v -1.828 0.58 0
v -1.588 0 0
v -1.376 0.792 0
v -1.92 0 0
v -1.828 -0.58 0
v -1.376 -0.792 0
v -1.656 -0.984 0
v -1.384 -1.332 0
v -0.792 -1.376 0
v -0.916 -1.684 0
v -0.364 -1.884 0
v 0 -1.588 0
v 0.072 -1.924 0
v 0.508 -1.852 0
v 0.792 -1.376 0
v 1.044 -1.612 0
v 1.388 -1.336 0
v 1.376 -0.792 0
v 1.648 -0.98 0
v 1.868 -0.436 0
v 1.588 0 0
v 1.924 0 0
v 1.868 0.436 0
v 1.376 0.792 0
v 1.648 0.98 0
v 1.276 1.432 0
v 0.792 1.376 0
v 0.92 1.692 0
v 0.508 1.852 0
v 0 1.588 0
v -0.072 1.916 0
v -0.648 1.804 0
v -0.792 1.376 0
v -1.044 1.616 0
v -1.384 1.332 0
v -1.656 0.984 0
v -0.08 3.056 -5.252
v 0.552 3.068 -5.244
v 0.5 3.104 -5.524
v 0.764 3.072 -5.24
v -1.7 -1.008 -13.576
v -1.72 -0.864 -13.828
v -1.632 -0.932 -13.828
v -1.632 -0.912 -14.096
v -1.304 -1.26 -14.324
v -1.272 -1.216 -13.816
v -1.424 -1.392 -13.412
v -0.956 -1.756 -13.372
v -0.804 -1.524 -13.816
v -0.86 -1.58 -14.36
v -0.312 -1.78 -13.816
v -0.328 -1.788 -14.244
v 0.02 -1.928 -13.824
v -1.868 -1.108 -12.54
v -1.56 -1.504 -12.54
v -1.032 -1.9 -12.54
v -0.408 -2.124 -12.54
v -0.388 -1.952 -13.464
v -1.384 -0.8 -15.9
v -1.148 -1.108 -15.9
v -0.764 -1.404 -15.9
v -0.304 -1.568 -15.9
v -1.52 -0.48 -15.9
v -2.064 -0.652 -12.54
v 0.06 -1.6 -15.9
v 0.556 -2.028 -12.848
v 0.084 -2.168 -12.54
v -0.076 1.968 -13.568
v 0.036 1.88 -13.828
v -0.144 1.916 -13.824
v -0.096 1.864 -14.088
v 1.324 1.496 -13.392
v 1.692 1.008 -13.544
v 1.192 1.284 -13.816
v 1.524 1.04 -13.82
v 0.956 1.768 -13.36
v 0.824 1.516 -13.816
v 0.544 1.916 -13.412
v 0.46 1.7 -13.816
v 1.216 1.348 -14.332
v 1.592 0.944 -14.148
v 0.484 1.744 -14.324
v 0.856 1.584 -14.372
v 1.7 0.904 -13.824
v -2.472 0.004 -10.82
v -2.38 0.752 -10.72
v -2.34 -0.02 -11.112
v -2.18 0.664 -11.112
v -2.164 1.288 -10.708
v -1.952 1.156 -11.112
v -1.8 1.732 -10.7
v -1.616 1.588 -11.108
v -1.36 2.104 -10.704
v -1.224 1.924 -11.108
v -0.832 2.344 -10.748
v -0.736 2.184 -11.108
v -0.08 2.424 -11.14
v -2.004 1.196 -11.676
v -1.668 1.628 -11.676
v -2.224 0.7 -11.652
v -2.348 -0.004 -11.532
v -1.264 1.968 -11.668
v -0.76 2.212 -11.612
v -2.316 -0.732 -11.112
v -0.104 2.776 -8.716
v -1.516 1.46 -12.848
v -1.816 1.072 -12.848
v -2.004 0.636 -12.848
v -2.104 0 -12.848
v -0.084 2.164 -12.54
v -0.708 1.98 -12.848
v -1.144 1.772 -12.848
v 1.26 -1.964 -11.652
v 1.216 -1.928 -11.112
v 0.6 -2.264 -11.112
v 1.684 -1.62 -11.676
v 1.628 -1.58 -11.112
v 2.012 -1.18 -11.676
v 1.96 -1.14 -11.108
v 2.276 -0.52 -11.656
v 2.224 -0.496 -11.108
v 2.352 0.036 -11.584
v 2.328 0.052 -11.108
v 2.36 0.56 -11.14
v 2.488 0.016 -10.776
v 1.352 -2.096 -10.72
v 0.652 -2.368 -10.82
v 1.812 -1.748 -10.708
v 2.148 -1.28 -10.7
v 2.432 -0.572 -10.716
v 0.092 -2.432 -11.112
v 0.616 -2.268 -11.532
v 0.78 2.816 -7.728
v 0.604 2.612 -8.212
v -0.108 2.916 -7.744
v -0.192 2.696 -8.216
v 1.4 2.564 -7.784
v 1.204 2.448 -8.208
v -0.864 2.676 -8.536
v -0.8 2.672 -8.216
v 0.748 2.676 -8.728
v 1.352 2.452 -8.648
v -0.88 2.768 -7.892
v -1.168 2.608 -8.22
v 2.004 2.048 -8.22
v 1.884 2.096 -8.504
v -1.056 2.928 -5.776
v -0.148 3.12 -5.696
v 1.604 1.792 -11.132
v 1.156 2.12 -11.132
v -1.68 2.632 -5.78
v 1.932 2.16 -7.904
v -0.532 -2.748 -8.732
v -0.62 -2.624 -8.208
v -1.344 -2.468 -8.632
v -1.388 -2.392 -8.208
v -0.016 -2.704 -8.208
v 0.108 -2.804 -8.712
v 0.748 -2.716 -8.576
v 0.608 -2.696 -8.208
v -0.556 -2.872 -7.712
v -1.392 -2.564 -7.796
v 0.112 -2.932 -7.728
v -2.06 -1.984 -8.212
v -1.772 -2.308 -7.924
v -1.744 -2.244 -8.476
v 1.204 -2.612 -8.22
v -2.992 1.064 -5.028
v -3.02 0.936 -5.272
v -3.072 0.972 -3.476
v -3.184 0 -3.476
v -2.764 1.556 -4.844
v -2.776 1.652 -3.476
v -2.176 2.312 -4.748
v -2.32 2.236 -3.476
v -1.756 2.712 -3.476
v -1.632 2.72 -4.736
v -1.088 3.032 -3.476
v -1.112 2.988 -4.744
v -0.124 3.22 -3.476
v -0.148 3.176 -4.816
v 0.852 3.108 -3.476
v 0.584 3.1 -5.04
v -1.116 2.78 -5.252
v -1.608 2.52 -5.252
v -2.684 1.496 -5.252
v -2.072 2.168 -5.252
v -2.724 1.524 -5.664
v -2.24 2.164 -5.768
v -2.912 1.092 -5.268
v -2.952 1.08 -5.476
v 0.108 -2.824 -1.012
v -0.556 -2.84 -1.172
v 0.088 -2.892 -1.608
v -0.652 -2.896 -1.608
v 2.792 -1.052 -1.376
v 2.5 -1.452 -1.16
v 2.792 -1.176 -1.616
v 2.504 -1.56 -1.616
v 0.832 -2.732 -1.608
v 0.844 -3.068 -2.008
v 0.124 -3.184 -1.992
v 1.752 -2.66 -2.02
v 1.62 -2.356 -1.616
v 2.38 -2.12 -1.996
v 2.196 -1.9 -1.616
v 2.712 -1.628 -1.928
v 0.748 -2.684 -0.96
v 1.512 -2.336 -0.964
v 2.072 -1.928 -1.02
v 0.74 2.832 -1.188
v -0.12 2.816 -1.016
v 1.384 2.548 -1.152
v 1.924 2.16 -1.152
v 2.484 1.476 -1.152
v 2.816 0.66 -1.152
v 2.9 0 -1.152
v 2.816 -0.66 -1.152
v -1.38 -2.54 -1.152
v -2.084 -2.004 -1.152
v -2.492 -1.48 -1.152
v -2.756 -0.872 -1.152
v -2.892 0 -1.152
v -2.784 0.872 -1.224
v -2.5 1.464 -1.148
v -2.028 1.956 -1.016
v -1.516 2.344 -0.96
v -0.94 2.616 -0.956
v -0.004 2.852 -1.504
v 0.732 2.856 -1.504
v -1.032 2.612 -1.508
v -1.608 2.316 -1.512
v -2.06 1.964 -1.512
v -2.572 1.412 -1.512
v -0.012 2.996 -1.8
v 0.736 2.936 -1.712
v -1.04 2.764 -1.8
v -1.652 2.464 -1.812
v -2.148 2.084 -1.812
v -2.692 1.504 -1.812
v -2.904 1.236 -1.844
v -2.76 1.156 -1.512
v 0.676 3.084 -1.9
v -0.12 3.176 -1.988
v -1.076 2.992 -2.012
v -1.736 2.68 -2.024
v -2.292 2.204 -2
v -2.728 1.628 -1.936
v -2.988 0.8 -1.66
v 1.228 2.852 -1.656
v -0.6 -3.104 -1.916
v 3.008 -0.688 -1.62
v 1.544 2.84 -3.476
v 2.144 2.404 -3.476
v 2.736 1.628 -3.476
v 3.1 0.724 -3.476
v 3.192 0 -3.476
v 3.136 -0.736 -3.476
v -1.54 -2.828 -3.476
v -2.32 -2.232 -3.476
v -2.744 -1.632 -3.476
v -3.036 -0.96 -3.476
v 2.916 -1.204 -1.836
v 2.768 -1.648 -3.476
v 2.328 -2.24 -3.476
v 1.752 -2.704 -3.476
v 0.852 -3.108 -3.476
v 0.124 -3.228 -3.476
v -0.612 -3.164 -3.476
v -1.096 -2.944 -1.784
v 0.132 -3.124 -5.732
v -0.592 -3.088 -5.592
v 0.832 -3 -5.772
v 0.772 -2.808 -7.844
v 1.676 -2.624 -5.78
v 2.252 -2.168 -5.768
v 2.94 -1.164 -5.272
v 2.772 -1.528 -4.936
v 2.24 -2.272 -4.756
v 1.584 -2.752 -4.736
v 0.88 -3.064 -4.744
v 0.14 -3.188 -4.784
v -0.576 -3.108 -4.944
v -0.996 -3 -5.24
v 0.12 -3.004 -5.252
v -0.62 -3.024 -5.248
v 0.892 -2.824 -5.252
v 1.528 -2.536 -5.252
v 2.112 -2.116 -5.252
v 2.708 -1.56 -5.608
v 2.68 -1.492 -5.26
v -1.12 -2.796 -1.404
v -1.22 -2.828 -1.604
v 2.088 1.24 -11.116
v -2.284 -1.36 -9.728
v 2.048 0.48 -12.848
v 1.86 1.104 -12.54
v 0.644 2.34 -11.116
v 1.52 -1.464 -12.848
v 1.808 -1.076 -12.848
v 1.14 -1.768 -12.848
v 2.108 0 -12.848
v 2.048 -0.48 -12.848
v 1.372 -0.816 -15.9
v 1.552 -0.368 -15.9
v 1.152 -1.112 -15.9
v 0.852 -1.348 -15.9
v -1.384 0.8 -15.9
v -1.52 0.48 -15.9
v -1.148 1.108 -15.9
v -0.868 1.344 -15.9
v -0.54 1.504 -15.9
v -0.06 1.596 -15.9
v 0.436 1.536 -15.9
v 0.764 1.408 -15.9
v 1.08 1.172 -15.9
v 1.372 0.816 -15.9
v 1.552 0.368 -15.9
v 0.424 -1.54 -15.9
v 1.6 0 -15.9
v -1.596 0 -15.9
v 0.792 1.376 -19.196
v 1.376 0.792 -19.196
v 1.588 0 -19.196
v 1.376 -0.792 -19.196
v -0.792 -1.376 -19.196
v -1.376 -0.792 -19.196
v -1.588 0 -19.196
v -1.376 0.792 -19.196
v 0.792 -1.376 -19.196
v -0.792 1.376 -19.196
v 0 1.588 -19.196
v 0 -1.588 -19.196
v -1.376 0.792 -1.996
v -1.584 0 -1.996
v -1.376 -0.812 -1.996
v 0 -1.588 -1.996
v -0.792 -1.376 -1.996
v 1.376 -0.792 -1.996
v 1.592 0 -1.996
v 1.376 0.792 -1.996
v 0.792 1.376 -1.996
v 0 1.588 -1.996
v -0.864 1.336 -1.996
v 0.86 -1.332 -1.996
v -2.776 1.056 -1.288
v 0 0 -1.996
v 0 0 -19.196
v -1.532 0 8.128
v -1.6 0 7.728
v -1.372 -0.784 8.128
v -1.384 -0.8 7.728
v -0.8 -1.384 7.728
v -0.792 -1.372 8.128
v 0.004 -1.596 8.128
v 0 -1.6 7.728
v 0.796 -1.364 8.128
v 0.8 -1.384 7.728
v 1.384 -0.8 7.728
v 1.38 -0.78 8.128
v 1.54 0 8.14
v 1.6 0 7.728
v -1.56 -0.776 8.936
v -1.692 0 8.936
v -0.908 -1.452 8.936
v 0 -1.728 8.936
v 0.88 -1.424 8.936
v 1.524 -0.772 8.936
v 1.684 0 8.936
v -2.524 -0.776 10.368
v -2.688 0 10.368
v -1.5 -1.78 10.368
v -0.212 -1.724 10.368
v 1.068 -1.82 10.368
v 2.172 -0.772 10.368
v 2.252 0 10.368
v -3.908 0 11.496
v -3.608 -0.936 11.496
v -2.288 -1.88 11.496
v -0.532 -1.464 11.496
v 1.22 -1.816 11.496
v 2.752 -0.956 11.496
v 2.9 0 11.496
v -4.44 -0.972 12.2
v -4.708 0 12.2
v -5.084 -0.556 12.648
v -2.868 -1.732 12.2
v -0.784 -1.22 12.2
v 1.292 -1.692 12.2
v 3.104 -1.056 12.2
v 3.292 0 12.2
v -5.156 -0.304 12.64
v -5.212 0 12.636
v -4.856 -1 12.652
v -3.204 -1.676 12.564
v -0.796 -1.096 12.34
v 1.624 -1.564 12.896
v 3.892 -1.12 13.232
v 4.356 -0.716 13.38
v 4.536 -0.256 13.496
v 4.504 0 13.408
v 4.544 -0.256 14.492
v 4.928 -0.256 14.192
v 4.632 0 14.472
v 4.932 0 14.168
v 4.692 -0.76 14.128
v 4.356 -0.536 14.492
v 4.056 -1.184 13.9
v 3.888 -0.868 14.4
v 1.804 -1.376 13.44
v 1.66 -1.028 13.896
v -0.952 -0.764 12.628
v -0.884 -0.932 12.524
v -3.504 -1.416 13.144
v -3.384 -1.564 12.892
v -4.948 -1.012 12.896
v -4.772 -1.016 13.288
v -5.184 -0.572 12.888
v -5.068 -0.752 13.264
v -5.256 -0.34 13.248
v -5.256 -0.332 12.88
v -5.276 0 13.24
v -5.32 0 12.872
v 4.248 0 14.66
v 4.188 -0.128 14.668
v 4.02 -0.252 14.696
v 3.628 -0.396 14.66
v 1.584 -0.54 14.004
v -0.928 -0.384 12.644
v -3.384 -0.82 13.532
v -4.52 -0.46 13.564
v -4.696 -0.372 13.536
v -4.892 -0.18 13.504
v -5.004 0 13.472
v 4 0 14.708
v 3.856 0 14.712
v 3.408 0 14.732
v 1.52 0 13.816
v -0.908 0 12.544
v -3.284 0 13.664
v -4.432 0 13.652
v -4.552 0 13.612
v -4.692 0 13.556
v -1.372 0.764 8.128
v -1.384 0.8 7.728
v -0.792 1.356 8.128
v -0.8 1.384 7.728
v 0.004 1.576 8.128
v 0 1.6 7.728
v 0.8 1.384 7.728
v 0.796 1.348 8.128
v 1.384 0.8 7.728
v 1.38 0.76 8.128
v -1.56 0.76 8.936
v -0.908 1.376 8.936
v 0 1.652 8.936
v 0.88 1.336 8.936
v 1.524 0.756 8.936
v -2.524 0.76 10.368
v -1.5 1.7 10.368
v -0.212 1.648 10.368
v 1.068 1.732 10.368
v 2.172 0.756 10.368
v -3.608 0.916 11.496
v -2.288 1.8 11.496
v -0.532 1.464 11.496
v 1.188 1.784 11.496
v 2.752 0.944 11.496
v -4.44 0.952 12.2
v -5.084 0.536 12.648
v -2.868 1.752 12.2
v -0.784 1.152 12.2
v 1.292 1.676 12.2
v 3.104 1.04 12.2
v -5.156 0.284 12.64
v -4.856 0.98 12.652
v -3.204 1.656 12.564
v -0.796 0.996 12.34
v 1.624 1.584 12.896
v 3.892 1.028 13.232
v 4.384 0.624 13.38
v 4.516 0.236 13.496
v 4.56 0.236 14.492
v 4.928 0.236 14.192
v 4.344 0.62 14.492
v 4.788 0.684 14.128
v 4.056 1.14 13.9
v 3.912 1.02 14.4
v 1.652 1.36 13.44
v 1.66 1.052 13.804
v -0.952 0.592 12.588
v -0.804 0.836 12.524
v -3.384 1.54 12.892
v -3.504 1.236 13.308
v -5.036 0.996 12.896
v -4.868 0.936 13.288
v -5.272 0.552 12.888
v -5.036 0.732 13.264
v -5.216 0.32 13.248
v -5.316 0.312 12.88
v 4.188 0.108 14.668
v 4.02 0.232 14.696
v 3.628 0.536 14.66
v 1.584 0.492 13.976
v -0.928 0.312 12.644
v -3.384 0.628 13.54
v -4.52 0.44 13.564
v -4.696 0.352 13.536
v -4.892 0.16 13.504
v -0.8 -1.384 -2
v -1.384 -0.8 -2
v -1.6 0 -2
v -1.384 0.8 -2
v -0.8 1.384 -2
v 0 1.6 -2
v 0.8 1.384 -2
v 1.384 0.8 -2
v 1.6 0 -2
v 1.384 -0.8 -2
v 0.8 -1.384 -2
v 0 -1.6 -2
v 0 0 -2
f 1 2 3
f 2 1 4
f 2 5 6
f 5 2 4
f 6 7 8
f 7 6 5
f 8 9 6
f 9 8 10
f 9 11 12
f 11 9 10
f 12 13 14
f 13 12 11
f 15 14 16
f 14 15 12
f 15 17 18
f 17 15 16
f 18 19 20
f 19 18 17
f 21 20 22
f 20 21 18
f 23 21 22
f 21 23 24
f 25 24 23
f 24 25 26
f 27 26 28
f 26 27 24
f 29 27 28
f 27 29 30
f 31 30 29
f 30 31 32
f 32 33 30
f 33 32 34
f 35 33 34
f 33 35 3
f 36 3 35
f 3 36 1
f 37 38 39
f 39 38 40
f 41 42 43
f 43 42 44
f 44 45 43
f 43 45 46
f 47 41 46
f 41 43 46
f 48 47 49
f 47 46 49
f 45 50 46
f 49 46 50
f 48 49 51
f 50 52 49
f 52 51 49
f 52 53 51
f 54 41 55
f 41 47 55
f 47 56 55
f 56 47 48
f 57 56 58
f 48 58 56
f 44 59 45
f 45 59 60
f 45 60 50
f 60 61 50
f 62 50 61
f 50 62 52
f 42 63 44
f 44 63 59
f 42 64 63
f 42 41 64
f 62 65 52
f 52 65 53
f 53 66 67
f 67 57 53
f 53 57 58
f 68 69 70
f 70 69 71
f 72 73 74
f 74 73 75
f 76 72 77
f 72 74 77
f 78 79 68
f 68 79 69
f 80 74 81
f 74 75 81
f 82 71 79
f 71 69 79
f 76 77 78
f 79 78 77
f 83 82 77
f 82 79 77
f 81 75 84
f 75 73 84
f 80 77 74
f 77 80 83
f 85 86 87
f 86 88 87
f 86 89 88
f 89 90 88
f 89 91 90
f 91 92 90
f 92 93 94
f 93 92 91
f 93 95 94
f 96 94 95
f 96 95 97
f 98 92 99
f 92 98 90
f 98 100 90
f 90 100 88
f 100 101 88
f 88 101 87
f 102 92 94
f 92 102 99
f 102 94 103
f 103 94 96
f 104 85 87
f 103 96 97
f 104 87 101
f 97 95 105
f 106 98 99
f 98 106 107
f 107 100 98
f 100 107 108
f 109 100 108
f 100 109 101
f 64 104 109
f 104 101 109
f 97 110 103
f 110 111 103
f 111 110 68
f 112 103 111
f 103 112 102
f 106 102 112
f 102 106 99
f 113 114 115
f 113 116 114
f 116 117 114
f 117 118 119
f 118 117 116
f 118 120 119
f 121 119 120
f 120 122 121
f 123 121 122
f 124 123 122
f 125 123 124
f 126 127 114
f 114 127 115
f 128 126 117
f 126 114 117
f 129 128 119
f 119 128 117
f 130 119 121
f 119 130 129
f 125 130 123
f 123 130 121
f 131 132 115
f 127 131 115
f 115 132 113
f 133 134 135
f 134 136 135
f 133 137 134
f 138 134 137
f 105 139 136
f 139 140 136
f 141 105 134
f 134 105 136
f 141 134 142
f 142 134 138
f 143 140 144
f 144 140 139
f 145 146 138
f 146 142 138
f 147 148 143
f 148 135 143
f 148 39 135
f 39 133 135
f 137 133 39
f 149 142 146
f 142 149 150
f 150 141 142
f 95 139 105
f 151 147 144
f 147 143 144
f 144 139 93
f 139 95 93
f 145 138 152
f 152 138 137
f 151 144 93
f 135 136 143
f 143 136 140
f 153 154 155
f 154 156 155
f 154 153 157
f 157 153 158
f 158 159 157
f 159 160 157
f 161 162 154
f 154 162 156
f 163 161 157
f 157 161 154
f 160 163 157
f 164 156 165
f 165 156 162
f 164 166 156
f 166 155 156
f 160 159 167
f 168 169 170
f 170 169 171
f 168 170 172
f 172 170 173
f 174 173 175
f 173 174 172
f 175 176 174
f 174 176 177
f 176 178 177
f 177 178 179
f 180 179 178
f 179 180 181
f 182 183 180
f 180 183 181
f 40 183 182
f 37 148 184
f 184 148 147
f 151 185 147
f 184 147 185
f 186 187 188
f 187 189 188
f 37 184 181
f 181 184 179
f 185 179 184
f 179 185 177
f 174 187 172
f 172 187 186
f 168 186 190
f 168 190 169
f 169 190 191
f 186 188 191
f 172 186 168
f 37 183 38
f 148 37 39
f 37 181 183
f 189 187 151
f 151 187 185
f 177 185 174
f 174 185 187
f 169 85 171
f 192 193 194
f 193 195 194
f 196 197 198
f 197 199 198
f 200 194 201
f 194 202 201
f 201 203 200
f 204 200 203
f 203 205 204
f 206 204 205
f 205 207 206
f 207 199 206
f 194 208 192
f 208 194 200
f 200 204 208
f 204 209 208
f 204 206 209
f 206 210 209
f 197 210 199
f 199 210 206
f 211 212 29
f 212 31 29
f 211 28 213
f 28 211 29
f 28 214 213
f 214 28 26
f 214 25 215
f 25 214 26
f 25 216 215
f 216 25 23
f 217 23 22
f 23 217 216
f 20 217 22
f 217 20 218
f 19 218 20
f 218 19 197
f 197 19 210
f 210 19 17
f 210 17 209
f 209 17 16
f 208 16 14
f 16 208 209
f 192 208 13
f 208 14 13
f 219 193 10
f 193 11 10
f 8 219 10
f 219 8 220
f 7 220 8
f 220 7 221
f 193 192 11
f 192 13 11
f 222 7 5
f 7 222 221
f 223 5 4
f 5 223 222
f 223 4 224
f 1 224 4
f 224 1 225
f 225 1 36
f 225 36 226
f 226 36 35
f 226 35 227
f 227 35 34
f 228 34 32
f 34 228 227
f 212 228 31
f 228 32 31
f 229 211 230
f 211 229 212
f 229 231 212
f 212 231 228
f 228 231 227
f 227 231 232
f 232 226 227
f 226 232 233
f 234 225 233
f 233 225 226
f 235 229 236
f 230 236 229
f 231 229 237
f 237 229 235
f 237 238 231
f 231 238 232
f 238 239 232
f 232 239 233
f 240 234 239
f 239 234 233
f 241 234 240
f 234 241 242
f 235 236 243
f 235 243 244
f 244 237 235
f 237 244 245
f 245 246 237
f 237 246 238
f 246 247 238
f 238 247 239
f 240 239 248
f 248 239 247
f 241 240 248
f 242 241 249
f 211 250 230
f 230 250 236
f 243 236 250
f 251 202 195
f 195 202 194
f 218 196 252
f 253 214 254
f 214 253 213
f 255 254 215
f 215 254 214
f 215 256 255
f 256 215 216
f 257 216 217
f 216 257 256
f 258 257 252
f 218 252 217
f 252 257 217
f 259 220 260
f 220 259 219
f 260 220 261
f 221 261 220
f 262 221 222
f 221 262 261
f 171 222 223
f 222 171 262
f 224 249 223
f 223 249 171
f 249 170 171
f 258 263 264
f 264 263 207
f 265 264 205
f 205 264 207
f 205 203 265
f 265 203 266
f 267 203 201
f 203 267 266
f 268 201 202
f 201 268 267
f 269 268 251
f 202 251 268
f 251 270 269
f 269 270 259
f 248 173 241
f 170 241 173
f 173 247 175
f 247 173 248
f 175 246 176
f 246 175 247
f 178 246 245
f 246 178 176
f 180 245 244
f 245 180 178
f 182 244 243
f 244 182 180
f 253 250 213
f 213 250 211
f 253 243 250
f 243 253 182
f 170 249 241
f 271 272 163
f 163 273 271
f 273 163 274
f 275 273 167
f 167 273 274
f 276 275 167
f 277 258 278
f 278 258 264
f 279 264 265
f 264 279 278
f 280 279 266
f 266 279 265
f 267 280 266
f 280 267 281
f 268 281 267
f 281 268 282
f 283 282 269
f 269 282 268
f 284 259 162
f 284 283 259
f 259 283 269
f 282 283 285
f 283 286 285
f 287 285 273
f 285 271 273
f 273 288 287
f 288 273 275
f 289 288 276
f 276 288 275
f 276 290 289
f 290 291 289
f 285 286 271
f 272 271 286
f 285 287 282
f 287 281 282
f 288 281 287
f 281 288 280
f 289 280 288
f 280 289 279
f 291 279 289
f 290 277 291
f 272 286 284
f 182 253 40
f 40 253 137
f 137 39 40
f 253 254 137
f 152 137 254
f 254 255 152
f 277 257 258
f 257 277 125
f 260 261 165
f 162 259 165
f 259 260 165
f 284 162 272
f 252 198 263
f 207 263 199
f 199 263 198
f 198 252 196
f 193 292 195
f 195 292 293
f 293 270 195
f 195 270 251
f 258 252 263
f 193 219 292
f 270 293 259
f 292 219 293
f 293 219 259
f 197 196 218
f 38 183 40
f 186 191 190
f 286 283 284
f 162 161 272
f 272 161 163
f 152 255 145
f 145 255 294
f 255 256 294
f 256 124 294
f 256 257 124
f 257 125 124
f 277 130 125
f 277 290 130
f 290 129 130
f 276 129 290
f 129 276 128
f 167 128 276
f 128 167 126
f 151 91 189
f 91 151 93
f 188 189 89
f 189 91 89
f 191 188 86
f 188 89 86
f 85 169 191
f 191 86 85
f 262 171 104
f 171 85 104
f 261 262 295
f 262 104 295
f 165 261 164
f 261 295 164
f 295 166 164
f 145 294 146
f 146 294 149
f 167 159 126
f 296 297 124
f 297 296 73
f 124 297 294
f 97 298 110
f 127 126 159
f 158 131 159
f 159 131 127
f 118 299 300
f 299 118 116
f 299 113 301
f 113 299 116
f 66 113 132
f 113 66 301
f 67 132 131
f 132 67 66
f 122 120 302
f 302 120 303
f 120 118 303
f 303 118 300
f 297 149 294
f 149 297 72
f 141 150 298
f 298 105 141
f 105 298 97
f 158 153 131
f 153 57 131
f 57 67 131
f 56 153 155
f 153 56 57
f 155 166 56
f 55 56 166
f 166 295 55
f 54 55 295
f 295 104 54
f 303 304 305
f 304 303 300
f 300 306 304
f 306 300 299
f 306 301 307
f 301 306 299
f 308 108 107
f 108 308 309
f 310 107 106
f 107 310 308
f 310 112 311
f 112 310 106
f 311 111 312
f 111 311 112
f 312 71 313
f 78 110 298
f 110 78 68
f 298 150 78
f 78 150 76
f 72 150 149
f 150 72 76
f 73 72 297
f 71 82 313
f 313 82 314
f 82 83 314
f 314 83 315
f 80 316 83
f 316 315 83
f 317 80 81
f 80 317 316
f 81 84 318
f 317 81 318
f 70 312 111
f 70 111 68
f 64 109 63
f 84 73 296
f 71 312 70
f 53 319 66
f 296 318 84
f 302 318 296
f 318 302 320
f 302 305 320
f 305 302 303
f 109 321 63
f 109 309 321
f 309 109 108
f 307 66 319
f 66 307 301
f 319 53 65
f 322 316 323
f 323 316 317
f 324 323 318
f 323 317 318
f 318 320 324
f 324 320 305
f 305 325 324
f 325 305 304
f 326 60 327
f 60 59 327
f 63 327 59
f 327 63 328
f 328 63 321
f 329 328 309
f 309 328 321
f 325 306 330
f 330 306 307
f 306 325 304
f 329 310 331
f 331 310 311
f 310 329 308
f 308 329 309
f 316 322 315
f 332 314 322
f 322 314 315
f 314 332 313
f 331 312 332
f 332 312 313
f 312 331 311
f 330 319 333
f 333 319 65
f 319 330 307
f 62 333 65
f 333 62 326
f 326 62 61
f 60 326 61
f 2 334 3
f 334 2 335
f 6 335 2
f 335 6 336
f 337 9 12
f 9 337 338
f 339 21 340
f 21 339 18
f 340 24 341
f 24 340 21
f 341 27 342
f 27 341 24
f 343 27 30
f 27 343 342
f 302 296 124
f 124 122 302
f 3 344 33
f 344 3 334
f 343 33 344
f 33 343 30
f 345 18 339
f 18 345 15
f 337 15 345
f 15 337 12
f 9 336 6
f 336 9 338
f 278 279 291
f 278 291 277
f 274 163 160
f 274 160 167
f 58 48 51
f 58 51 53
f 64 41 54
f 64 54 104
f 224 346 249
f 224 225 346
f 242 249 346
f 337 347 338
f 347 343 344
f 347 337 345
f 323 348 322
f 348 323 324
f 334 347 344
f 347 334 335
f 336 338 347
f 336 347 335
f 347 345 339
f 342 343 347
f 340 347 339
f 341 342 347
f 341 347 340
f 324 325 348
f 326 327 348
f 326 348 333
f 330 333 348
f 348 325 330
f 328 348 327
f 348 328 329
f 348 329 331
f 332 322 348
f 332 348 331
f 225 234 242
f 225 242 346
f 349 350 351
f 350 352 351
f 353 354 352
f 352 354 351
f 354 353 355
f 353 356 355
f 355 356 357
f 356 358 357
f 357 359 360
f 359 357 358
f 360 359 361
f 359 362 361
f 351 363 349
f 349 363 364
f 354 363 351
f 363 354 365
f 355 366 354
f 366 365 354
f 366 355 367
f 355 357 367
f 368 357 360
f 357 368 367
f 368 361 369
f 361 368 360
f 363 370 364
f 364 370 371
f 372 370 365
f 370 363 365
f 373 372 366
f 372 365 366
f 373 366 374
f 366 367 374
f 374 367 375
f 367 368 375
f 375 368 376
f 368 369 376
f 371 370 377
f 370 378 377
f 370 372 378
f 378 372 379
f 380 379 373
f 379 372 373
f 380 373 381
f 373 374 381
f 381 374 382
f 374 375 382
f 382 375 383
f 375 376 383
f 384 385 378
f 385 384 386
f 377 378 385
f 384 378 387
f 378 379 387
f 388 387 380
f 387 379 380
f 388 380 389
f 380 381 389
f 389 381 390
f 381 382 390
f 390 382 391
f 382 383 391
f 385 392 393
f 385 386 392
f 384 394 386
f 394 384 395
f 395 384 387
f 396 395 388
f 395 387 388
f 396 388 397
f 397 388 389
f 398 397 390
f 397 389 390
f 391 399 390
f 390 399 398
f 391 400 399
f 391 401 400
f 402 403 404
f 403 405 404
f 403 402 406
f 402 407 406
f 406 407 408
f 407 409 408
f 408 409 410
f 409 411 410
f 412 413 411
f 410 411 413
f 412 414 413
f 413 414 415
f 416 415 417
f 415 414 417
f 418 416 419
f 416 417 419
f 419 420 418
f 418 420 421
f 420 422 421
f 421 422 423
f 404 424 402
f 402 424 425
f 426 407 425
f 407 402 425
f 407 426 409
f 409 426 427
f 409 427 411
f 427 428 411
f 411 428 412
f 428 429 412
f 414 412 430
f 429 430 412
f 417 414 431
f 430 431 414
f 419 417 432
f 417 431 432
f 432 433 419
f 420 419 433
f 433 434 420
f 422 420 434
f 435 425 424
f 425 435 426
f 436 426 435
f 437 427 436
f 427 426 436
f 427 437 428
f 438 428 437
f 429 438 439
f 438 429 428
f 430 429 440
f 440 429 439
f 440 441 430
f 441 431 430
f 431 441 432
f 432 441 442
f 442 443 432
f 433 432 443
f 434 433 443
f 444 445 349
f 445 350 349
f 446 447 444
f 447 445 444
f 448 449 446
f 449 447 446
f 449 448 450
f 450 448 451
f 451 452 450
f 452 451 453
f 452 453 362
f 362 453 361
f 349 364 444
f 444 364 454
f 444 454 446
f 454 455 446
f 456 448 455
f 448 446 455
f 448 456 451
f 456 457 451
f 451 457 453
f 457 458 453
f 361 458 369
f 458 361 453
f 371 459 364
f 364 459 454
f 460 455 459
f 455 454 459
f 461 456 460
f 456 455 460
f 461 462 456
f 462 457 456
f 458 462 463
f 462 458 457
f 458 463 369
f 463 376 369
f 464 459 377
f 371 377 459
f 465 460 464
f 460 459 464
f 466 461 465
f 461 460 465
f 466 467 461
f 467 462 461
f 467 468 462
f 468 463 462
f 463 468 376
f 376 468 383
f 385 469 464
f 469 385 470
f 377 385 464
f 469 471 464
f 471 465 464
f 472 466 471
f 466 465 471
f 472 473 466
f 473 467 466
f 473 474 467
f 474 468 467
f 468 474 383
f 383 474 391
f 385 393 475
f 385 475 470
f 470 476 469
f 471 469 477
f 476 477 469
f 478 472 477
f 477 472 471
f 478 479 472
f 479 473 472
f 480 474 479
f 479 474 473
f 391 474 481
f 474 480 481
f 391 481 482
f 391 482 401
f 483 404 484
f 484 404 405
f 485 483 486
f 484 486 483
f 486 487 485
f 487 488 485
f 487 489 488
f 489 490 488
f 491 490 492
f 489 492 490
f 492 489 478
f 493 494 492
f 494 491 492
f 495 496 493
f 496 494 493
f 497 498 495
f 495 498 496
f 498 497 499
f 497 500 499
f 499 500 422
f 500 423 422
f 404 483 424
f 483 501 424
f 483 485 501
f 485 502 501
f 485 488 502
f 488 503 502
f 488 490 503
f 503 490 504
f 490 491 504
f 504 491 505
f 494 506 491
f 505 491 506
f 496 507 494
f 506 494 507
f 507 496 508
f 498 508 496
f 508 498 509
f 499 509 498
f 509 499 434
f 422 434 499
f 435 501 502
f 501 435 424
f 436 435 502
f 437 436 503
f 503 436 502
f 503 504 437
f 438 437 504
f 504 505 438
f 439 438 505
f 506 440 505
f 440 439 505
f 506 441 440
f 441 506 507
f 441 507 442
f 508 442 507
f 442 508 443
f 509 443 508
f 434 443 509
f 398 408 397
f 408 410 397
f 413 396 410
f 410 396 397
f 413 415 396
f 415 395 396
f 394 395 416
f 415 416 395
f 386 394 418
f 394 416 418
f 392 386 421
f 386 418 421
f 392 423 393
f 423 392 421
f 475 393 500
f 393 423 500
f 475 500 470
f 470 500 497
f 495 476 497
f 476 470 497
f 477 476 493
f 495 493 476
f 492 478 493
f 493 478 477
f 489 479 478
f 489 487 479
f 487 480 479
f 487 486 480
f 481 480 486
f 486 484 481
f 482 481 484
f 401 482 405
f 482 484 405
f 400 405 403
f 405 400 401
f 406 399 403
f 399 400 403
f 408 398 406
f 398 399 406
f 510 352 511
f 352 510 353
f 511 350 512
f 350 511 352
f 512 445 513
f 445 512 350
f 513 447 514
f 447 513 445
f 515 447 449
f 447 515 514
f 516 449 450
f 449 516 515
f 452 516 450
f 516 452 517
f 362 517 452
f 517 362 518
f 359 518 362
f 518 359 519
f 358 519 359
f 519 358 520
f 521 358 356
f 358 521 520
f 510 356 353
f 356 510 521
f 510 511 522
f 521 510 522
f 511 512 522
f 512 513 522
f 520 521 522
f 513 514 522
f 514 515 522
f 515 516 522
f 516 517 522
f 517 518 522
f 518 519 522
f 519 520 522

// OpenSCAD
use <../lib.scad>
use <33172.scad>
use <33183.scad>
function ldraw_lib__33172c04() = [
// 0 Minifig Food Carrot with Reddish Brown Leaves (Complete)
// 0 Name: 33172c04.dat
// 0 Author: Vincent Messenet [Cheenzo]
// 0 !LDRAW_ORG Shortcut UPDATE 2025-08
// 0 !LICENSE Licensed under CC BY 4.0 : see CAreadme.txt
// 
// 0 BFC CERTIFY CCW
  [0,"BFC","CERTIFY"],
  [0,"BFC","CCW"],
// 
// 0 !CATEGORY Minifig Accessory
// 
// 0 !HISTORY 2025-08-31 [OrionP] Official Update 2025-08
// 
// 1 16 0 0 0 1 0 0 0 1 0 0 0 1 33172.dat
  [1,16,0,0,0,1,0,0,0,1,0,0,0,1, ldraw_lib__33172()],
// 1 70 0 5 0 1 0 0 0 1 0 0 0 1 33183.dat
  [1,70,0,5,0,1,0,0,0,1,0,0,0,1, ldraw_lib__33183()],
// 
];
module ldraw_lib__33172c04(step=0, col=false, unit=2/5, alt=false, line=0.2, solid=!$preview)
    makepoly(ldraw_lib__33172c04(), step=step, col=col, unit=unit, alt=alt, line=line, solid=solid);
ldraw_lib__33172c04(line=0.2);
